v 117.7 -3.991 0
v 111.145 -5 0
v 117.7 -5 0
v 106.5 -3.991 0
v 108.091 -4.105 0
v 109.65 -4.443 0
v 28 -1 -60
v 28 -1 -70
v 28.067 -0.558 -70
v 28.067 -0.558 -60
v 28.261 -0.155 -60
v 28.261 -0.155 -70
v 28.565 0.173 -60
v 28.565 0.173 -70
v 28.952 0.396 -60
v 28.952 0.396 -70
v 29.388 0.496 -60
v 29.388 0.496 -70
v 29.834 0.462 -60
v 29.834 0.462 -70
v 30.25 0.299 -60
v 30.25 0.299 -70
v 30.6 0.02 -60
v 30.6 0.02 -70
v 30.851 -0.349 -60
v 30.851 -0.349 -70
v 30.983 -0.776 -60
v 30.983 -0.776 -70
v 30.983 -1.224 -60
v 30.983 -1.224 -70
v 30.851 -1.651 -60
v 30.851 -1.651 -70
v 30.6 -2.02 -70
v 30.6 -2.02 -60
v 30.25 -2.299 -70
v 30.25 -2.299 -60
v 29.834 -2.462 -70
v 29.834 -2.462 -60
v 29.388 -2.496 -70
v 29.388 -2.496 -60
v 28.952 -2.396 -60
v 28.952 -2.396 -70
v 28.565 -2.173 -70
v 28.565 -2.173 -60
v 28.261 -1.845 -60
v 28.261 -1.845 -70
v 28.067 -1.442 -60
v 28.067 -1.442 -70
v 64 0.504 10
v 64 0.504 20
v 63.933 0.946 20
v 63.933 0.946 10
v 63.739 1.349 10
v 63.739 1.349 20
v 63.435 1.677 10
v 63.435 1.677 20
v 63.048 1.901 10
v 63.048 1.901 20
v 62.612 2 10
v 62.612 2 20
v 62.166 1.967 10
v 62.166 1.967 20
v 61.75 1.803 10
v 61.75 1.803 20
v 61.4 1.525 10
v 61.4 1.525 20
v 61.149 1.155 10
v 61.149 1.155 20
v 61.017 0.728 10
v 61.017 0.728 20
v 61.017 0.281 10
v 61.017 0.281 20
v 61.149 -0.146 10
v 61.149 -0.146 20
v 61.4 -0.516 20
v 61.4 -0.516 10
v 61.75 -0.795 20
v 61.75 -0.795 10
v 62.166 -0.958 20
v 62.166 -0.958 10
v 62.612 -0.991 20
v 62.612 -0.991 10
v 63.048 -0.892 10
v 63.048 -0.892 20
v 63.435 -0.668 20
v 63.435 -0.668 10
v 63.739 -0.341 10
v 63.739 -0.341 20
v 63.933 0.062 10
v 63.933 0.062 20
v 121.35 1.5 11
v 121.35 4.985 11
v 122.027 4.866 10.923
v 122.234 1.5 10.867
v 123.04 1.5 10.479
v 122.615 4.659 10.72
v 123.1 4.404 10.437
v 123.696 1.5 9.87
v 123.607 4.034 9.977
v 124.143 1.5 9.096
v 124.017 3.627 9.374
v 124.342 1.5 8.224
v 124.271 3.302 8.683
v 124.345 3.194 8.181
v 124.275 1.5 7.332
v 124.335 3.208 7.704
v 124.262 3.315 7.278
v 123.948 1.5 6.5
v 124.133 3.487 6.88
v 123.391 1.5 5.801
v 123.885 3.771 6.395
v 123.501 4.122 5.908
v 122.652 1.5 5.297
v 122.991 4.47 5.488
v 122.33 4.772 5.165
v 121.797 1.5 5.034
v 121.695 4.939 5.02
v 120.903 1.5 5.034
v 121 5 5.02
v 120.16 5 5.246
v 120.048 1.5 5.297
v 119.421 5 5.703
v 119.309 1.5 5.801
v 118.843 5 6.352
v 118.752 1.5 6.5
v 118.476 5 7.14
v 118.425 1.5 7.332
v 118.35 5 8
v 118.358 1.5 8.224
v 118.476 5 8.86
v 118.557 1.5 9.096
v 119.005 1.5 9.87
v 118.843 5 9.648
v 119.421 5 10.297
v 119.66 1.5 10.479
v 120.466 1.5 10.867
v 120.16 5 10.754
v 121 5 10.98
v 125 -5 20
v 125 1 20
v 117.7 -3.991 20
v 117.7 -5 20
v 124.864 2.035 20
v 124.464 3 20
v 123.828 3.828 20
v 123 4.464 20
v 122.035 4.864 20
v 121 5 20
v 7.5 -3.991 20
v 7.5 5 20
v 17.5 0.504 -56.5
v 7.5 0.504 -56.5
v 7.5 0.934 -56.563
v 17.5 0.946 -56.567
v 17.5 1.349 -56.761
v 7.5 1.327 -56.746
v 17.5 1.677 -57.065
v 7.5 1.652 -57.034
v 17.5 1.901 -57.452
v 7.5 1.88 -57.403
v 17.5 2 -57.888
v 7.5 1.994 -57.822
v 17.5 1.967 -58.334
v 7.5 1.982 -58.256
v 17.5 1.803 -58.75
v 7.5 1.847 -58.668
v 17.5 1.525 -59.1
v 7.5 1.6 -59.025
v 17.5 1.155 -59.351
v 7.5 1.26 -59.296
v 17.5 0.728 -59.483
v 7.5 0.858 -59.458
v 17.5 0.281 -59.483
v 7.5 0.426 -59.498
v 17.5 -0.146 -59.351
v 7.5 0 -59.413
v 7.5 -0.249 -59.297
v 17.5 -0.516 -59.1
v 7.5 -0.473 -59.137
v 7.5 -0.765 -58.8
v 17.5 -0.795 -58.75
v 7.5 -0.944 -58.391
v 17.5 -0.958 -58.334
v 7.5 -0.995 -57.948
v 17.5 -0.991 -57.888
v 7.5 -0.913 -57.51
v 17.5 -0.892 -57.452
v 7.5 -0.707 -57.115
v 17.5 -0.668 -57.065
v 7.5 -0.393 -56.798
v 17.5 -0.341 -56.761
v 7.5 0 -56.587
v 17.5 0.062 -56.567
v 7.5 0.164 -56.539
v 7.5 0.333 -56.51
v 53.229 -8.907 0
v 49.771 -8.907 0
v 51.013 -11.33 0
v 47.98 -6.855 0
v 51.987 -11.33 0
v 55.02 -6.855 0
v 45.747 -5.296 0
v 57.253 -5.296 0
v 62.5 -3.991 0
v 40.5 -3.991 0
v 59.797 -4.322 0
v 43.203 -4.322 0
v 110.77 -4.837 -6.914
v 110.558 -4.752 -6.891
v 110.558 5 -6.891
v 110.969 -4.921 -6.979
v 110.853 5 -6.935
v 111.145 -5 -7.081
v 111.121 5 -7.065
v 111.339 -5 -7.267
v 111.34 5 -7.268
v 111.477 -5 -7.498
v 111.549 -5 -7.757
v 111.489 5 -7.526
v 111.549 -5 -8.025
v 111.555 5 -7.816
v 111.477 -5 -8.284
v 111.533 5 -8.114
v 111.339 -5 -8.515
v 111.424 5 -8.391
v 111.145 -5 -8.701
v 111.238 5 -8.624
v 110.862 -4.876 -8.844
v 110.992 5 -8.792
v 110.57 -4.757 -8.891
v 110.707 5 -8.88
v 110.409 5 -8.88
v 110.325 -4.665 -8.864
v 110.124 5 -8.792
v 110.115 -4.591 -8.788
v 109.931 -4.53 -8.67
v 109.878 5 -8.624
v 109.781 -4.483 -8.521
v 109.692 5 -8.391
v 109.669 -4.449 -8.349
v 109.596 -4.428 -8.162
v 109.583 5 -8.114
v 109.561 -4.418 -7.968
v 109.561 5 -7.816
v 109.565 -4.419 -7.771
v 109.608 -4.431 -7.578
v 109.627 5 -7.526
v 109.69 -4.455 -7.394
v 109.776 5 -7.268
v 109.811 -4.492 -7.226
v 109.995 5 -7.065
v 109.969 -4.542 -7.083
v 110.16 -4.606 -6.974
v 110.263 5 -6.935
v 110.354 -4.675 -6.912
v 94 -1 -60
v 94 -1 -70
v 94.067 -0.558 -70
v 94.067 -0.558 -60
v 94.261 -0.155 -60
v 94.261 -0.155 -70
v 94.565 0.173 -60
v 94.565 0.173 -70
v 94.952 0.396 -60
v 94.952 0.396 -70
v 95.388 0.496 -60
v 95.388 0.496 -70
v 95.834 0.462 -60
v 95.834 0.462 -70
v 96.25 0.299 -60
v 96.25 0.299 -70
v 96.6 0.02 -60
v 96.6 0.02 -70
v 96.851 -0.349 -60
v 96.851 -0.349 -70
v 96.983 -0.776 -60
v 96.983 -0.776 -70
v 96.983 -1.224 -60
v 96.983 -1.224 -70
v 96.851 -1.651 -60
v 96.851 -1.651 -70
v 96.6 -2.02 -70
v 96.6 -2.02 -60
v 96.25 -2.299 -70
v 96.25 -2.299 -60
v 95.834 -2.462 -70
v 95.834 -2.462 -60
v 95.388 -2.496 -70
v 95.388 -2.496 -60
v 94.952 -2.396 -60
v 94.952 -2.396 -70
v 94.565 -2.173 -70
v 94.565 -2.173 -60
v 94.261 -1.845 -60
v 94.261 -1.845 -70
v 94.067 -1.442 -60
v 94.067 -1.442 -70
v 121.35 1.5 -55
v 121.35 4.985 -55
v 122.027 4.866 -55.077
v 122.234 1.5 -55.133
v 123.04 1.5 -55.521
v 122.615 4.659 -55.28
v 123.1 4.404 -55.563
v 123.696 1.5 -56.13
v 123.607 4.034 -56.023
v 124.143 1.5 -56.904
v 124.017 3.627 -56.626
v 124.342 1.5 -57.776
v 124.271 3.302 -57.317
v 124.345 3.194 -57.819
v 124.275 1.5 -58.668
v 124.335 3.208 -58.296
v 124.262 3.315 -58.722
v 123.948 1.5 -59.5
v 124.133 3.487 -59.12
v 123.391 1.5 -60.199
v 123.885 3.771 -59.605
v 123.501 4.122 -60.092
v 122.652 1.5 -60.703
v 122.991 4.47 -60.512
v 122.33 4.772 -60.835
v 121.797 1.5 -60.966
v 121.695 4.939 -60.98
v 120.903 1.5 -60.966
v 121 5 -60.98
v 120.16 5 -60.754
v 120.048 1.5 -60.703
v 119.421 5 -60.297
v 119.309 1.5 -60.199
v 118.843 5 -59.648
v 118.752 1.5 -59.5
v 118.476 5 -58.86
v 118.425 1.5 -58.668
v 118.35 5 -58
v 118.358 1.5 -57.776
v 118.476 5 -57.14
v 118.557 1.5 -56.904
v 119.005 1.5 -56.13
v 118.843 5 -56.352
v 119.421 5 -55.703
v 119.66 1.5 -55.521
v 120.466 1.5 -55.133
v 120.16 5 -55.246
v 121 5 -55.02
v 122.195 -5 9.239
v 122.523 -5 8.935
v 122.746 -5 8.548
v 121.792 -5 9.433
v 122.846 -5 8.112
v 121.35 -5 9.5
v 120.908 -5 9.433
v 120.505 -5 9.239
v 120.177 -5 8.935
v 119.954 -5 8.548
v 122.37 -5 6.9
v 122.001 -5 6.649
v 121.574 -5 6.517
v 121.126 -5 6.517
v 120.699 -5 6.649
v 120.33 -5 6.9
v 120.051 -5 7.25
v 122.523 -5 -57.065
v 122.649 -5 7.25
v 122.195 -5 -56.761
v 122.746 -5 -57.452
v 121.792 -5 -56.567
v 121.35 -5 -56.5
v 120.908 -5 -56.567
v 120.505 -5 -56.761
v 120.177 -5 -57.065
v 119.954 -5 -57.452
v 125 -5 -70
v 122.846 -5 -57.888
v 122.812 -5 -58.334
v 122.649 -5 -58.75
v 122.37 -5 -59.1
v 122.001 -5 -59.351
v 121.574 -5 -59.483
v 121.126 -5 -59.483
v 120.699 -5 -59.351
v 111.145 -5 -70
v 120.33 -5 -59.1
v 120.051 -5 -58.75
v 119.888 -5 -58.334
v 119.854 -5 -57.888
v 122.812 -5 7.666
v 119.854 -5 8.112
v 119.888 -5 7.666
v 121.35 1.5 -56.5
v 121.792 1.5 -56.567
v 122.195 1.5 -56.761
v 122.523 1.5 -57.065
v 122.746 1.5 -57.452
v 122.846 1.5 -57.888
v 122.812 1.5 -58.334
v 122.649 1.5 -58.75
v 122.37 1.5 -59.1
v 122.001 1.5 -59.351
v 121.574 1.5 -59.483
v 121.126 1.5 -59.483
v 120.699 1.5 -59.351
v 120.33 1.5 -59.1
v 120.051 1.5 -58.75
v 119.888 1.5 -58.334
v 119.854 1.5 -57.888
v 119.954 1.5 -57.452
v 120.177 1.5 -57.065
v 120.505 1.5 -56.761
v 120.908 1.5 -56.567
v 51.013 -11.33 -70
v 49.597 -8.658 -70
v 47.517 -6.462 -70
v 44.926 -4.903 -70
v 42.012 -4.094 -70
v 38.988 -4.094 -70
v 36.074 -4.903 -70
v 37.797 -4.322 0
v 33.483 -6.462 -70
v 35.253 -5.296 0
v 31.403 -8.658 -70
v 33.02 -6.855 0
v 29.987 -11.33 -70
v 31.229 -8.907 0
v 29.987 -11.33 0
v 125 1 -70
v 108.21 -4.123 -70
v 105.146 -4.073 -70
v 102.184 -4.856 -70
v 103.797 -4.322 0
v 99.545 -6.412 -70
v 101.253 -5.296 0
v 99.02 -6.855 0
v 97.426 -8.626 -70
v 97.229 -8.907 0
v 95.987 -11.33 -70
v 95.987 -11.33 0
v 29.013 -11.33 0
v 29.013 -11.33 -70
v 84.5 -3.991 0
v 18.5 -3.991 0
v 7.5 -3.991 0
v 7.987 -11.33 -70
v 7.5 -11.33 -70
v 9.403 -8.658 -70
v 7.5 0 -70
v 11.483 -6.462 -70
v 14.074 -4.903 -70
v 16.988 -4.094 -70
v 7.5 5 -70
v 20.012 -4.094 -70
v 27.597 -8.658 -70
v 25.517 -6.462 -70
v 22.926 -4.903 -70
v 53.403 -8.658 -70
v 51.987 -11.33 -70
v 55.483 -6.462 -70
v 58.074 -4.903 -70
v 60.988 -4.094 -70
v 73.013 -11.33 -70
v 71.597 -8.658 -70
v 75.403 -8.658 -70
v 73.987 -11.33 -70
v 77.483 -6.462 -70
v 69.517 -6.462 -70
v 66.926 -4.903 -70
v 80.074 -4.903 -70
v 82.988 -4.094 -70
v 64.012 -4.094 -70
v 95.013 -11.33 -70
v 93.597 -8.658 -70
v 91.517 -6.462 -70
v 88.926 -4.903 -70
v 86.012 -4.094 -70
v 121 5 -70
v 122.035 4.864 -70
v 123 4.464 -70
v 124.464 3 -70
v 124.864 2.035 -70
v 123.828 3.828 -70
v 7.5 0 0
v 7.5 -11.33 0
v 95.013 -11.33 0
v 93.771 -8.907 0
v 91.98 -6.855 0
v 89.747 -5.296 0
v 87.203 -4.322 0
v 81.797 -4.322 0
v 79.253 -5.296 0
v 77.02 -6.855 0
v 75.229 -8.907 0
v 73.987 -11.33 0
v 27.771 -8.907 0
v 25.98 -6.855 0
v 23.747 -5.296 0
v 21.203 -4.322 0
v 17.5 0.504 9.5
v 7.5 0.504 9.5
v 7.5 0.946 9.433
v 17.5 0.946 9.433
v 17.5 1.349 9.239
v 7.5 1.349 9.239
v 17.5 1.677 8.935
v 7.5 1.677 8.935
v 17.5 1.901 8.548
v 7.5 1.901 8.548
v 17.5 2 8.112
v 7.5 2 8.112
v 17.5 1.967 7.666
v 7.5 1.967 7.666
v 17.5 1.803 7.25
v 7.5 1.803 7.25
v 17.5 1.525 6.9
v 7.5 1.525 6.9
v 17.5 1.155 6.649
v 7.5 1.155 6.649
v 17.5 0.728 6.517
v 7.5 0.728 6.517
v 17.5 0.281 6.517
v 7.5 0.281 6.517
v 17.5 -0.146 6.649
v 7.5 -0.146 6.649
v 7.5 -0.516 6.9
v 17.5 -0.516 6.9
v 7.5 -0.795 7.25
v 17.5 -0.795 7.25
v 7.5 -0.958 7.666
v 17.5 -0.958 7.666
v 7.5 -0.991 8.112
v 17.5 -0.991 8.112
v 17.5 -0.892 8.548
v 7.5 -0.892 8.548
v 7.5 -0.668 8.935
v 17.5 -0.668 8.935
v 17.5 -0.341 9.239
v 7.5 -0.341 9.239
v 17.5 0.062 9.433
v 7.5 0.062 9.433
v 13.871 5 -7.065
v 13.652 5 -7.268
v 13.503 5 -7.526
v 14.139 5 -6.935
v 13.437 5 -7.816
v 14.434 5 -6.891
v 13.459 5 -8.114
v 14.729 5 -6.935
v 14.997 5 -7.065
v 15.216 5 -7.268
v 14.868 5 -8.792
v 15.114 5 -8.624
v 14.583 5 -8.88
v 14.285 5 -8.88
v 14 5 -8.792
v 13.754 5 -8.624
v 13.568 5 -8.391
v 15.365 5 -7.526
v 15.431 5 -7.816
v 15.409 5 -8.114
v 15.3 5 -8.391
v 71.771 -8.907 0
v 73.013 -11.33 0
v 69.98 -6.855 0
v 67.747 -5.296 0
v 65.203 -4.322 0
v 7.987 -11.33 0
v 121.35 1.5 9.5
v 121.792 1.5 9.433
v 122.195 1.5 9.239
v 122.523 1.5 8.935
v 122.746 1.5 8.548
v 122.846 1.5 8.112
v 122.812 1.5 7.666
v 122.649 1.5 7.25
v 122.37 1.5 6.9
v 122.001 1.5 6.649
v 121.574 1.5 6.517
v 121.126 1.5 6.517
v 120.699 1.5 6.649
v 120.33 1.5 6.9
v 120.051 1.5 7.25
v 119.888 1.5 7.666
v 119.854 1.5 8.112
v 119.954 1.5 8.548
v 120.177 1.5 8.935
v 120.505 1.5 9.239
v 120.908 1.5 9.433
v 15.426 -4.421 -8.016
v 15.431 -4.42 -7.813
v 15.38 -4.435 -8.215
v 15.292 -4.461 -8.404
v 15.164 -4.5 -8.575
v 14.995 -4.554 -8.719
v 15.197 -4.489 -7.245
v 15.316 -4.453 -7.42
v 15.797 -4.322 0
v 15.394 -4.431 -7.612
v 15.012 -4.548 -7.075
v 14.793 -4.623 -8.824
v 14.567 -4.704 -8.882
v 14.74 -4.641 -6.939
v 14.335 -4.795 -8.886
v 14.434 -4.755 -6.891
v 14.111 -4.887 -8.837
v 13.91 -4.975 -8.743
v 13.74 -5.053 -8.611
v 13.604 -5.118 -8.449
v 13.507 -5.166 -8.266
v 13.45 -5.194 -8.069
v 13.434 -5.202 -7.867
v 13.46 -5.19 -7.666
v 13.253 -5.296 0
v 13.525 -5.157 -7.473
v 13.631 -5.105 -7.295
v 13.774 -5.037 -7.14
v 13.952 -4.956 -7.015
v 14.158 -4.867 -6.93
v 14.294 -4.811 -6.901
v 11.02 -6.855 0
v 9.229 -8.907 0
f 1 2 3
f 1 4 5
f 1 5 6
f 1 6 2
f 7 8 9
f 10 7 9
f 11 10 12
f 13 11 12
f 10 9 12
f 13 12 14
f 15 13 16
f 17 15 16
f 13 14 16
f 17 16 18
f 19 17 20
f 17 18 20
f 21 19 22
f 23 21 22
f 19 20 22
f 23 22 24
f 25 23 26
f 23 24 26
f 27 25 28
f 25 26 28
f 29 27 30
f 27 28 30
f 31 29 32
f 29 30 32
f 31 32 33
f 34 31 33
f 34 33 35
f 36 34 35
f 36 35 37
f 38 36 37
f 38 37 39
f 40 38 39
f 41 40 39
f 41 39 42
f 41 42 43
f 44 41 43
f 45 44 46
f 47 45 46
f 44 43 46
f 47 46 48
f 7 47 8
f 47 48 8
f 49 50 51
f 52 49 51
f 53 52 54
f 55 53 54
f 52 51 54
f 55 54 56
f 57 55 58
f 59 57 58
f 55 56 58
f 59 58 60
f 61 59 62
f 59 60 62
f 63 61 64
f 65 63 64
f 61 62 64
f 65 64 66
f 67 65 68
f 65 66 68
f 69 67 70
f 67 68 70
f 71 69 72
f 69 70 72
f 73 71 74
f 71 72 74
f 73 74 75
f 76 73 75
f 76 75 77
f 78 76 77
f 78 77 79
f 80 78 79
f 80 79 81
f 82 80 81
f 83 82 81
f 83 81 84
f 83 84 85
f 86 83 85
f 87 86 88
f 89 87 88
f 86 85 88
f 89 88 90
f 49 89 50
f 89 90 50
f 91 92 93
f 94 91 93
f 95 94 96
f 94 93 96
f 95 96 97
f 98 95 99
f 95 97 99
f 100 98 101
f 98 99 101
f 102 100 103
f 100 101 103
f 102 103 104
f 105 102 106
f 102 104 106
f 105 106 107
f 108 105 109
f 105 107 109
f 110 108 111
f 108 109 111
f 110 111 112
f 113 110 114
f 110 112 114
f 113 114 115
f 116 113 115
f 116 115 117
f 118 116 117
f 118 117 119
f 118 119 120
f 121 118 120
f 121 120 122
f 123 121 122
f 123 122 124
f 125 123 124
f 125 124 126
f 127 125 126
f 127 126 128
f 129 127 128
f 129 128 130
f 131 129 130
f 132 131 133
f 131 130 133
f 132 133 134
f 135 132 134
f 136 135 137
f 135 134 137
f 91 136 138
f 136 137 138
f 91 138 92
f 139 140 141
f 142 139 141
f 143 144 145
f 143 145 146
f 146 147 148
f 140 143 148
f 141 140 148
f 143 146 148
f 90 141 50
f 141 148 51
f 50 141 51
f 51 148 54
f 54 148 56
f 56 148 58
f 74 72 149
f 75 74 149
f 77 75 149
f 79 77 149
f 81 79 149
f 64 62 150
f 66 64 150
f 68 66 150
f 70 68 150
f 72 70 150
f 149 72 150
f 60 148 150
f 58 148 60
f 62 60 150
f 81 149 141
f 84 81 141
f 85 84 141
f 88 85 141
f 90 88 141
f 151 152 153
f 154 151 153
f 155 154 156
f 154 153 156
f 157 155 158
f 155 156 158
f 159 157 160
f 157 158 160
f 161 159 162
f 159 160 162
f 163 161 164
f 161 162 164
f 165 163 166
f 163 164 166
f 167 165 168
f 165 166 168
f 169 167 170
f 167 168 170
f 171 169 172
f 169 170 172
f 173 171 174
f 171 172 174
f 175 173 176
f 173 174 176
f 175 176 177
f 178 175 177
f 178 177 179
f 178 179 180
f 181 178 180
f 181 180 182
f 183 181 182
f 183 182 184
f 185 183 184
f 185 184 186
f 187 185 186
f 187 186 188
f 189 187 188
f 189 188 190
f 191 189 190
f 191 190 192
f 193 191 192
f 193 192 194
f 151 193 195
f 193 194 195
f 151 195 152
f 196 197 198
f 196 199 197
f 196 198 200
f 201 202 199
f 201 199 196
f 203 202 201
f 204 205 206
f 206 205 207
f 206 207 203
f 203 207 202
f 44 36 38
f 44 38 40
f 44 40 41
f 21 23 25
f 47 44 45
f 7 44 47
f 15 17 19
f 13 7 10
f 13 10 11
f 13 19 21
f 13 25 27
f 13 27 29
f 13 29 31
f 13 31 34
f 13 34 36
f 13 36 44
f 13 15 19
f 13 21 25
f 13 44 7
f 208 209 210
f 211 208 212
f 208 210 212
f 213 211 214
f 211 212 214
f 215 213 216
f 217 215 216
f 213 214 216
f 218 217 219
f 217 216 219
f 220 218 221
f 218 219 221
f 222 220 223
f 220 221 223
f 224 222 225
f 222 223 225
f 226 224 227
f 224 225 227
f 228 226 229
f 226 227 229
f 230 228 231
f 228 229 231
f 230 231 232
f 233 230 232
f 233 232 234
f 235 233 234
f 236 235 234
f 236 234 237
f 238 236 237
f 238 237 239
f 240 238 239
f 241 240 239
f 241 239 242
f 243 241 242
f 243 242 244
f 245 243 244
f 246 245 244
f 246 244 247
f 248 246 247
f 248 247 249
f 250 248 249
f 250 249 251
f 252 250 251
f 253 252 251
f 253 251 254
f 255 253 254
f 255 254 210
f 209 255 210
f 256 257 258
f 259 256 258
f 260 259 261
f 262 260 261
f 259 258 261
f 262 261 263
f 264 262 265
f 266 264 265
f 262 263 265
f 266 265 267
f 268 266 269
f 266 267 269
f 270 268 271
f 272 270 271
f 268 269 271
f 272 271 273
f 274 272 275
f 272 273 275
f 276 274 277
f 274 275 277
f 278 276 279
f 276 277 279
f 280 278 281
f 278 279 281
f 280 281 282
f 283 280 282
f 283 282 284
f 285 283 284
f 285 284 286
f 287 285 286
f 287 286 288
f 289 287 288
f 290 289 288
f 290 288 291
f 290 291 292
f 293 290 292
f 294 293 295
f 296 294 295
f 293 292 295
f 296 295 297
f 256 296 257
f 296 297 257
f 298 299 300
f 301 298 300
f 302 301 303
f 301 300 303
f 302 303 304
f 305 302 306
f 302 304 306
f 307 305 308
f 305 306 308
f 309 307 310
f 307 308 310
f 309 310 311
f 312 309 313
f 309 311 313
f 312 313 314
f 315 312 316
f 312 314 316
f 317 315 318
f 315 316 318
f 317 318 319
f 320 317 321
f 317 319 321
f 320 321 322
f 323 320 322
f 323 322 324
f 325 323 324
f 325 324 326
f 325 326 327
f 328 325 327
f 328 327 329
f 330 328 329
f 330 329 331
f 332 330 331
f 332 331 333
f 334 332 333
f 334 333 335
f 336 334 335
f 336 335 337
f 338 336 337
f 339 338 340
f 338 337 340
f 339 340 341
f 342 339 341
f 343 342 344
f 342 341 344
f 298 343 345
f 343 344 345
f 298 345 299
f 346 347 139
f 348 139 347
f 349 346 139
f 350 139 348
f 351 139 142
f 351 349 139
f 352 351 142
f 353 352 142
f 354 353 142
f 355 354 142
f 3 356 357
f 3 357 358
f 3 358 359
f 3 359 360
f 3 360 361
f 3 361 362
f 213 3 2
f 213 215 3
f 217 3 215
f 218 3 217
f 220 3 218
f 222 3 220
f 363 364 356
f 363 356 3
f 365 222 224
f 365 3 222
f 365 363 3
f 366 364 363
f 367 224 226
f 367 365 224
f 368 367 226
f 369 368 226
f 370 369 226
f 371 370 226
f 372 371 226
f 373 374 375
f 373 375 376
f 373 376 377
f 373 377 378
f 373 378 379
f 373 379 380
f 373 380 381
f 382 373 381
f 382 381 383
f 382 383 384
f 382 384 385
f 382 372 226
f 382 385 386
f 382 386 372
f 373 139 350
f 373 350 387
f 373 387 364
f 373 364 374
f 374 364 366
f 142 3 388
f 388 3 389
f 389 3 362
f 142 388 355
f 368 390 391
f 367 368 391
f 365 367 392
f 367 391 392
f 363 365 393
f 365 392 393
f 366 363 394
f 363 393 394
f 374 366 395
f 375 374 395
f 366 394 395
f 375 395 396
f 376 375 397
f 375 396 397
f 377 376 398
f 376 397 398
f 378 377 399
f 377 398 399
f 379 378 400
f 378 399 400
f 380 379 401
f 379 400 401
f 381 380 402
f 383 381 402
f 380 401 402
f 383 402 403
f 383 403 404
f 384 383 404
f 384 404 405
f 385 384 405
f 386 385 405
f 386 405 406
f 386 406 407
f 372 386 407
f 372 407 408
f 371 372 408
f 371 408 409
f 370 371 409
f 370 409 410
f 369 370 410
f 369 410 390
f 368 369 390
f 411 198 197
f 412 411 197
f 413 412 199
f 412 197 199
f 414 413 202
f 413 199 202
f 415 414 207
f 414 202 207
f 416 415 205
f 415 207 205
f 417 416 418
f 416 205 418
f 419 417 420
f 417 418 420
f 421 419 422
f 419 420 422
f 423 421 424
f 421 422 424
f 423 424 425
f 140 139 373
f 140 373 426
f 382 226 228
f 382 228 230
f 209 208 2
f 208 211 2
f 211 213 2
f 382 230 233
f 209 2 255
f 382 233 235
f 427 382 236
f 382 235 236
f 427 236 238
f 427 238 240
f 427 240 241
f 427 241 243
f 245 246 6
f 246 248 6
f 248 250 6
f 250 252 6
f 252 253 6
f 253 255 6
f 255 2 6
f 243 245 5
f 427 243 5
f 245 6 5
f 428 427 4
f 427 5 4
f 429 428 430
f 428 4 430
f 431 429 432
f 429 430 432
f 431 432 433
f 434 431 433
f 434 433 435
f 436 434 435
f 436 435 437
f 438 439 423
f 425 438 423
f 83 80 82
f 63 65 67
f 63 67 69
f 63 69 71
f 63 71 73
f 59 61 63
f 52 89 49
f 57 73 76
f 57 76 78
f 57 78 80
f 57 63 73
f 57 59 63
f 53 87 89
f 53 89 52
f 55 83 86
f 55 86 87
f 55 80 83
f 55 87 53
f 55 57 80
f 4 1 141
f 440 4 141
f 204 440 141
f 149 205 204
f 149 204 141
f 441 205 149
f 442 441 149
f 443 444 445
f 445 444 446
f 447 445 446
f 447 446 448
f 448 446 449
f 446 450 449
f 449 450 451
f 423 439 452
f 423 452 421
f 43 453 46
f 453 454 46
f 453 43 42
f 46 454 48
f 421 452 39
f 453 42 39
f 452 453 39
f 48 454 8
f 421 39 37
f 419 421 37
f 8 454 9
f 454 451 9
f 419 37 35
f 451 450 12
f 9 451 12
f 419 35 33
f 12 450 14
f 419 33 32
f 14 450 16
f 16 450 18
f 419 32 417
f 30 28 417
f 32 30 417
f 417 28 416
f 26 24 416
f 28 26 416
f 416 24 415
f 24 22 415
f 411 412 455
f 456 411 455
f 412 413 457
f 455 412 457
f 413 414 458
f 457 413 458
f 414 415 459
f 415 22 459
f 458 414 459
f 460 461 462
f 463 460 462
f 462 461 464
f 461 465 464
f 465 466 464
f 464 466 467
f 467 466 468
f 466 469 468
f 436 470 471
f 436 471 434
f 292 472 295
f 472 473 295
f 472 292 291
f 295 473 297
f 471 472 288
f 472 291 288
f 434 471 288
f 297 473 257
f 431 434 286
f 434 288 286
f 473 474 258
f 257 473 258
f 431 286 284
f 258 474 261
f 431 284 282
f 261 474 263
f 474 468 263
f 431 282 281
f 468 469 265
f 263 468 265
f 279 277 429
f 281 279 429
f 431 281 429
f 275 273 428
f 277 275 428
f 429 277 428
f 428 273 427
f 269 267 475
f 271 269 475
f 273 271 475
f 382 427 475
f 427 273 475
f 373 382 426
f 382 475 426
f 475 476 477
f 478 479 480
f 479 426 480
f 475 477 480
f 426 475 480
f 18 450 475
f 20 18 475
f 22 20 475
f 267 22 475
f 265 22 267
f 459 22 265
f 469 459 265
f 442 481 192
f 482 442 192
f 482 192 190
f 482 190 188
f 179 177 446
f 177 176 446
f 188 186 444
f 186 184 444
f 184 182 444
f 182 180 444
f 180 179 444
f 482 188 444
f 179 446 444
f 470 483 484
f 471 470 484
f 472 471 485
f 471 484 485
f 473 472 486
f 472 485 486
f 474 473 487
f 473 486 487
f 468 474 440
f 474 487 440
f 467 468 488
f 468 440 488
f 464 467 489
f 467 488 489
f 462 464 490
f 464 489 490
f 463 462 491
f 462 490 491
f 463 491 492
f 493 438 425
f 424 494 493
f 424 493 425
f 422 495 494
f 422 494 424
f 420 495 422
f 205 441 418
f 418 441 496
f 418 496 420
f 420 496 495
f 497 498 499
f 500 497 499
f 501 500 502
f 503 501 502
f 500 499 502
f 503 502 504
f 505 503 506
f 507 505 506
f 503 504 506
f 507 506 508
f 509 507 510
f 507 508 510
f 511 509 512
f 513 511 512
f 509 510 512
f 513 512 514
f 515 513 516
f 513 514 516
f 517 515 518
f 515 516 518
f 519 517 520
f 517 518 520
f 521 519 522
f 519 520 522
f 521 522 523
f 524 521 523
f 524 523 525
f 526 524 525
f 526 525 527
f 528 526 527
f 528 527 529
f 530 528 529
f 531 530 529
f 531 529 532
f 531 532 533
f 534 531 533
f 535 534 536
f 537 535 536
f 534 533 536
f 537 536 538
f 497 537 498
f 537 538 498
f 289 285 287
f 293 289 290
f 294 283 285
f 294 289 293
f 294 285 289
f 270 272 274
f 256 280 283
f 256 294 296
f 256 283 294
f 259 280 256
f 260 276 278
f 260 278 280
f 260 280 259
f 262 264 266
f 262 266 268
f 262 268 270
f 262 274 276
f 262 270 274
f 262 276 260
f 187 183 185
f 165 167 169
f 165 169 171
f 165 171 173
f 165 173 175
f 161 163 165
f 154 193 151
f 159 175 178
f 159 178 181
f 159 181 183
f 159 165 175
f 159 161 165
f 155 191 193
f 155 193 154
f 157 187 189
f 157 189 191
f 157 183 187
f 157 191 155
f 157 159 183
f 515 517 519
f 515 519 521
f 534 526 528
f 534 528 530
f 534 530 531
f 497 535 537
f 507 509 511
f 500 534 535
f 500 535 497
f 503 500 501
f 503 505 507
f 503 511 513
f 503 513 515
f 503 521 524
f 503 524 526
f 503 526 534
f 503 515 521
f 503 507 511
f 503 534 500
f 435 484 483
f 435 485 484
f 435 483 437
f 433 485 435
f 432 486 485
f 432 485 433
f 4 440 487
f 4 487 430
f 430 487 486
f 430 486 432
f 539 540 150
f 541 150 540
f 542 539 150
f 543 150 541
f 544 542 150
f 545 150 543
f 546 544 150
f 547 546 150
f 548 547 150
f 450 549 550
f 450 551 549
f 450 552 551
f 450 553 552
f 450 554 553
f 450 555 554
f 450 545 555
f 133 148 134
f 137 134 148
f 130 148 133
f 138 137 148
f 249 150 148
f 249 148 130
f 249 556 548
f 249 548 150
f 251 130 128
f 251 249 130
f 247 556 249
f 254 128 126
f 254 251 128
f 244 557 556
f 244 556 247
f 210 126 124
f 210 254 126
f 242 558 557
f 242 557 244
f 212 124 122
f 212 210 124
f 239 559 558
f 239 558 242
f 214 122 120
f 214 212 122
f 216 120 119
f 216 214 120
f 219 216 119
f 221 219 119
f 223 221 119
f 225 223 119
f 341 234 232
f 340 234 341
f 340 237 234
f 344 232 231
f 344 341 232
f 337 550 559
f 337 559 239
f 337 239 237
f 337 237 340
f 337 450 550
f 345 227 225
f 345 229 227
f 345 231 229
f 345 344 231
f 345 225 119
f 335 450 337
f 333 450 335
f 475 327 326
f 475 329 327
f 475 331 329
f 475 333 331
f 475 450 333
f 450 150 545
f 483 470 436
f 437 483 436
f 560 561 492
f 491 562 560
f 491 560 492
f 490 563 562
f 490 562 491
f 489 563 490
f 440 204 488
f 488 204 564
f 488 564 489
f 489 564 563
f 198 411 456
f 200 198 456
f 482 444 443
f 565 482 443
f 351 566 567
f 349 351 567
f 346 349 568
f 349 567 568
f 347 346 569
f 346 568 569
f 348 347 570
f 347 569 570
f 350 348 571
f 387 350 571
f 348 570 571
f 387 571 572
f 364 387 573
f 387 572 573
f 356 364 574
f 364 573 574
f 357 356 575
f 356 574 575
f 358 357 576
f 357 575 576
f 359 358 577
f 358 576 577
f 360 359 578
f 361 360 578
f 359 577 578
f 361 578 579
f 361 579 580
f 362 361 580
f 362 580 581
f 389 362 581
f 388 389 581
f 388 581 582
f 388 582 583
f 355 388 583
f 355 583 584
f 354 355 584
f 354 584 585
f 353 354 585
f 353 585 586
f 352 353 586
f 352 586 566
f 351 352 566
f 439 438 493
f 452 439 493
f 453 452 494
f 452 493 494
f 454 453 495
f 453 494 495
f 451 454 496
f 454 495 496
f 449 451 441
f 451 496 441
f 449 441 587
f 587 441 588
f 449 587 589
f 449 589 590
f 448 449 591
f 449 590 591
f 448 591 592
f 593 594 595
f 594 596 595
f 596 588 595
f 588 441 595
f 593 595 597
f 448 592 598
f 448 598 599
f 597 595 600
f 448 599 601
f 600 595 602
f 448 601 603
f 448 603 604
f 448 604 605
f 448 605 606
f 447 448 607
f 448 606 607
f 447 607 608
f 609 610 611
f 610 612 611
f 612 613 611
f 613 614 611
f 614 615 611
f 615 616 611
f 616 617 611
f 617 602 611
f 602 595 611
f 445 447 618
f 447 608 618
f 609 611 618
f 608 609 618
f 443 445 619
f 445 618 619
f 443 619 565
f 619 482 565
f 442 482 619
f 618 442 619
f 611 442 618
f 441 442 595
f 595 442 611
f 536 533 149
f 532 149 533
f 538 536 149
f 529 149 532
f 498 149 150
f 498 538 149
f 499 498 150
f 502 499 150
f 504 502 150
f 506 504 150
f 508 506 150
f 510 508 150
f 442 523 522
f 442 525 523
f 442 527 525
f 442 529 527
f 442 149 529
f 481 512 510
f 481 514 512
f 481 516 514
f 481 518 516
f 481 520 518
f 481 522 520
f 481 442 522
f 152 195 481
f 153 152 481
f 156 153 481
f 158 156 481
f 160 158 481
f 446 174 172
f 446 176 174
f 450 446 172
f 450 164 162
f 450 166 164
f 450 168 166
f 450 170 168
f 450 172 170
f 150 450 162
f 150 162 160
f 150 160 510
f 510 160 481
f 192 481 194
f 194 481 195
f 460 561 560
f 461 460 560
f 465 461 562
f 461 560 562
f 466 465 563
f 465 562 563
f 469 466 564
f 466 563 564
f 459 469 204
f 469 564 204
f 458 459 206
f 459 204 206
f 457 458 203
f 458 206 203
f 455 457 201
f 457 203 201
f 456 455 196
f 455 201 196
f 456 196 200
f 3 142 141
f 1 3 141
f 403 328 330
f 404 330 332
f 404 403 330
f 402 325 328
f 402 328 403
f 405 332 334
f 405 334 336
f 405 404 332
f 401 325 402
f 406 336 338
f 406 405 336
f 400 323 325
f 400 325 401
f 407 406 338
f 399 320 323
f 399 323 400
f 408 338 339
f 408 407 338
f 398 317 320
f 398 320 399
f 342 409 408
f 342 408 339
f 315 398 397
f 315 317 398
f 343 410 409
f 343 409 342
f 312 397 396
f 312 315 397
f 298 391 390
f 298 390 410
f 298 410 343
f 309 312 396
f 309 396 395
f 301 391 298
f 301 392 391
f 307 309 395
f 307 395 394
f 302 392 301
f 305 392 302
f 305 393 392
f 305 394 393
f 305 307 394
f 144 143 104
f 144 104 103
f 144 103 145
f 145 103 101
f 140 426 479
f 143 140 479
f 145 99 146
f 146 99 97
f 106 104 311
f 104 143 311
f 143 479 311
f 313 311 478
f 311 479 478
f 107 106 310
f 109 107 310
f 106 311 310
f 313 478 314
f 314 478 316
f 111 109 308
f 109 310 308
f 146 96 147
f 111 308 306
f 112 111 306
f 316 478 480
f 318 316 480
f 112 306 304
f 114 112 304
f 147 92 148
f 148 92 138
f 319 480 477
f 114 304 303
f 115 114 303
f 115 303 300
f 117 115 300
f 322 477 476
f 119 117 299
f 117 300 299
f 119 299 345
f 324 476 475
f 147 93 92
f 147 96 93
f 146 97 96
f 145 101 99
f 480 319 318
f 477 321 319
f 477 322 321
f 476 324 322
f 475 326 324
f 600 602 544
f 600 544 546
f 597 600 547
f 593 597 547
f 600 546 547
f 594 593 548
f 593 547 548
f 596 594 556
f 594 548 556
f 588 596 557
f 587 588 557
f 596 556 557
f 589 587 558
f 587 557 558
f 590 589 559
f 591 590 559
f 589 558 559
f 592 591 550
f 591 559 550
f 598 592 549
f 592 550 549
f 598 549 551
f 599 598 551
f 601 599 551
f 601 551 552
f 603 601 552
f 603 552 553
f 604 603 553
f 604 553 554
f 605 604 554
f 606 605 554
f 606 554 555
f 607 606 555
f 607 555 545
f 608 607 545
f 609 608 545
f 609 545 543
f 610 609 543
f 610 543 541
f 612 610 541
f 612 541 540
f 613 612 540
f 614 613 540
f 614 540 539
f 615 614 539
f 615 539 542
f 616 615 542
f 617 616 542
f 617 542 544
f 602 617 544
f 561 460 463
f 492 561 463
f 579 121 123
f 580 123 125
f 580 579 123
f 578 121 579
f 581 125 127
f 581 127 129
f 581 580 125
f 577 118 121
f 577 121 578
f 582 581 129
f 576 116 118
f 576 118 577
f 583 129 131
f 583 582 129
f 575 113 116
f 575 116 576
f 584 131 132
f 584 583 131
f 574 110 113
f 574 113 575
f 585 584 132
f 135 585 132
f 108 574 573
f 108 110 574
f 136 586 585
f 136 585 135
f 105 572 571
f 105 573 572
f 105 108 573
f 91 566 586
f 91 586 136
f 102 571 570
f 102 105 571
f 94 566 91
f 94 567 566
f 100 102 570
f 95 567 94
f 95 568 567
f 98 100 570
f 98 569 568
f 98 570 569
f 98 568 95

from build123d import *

# Parameters (mm, degrees)
SKETCH_1_W          = 125
SKETCH_1_H          = 70
EXTRUDE_1_DEPTH     = 5
SKETCH_2_W          = 7.5
SKETCH_2_H          = 5
CUT_EXTRUDE_1_DEPTH = 70
EXTRUDE_START       = -70
EXTRUDE_2_DEPTH     = 70
CUT_EXTRUDE_2_REACH = 145.713
SKETCH_5_R          = 11.2
EXTRUDE_3_DEPTH     = 20
SKETCH_7_R          = 1.5
CUT_EXTRUDE_3_DEPTH = 10
CUT_EXTRUDE_4_REACH = 146.193
SKETCH_8_R          = 1.5
SKETCH_9_R          = 3
SKETCH_9_R_2        = 1.5
CUT_EXTRUDE_5_DEPTH = 3.5
SKETCH_11_R         = 1.5
CUT_EXTRUDE_6_DEPTH = 10
CUT_EXTRUDE_7_REACH = 146.193
SKETCH_12_R         = 1
FILLET_1_R          = 4
SKETCH_14_R         = 1.5
CUT_EXTRUDE_8_DEPTH = 10


# Read off the part's stored shape, not the designer's step: 凸台-拉伸2
with BuildPart() as part:
    # 草图1 → 凸台-拉伸1 (new body)
    with BuildSketch(Plane(origin=(0, 0, 0), x_dir=(1, 0, 0), z_dir=(0, 1, 0))):
        with Locations((62.5, 35)):
            Rectangle(SKETCH_1_W, SKETCH_1_H)
    extrude(amount=EXTRUDE_1_DEPTH)

    # 草图2 → 切除-拉伸1 (cut)
    with BuildSketch(Plane.XY):
        with Locations((3.75, 2.5)):
            Rectangle(SKETCH_2_W, SKETCH_2_H)
    extrude(amount=-CUT_EXTRUDE_1_DEPTH, mode=Mode.SUBTRACT)

    # 凸台-拉伸2 outline → 凸台-拉伸2 (add)
    with BuildSketch(Plane.XY.offset(EXTRUDE_START)):
        with BuildLine():
            Line((125, -5), (125, 0))
            Line((125, 0), (7.5, 0))
            Line((7.5, 0), (7.500013395, -11.329987981))
            Line((7.500013395, -11.329987981), (8.200014526, -11.329987981))
            ThreePointArc((8.200014526, -11.329987981), (18.500017961, -4.191325734), (28.800021395, -11.329987981))
            Line((28.800021395, -11.329987981), (30.200014526, -11.329987981))
            ThreePointArc((30.200014526, -11.329987981), (40.500017961, -4.191325734), (50.800021395, -11.329987981))
            Line((50.800021395, -11.329987981), (52.200014526, -11.329987981))
            ThreePointArc((52.200014526, -11.329987981), (62.500017961, -4.191325734), (72.800021395, -11.329987981))
            Line((72.800021395, -11.329987981), (74.200014526, -11.329987981))
            ThreePointArc((74.200014526, -11.329987981), (84.500017961, -4.191325734), (94.800021395, -11.329987981))
            Line((94.800021395, -11.329987981), (96.200014526, -11.329987981))
            ThreePointArc((96.200014526, -11.329987981), (102.083615638, -5.116833662), (110.639689418, -5))
            Line((110.639689418, -5), (125, -5))
        make_face()
    extrude(amount=EXTRUDE_2_DEPTH)

    # 草图5 → 切除-拉伸2 (cut, up to next)
    with BuildSketch(Plane.XY, mode=Mode.PRIVATE) as cut_extrude_2_sk1:
        with Locations((18.500017961, -15.191325734)):
            Circle(SKETCH_5_R)
    cut_extrude_2_tool1 = extrude(cut_extrude_2_sk1.sketch, amount=-CUT_EXTRUDE_2_REACH, mode=Mode.PRIVATE) & part.part
    # 草图5 → 切除-拉伸2 (cut, up to next)
    with BuildSketch(Plane.XY, mode=Mode.PRIVATE) as cut_extrude_2_sk2:
        with Locations((40.500017961, -15.191325734)):
            Circle(SKETCH_5_R)
    cut_extrude_2_tool2 = extrude(cut_extrude_2_sk2.sketch, amount=-CUT_EXTRUDE_2_REACH, mode=Mode.PRIVATE) & part.part
    # 草图5 → 切除-拉伸2 (cut, up to next)
    with BuildSketch(Plane.XY, mode=Mode.PRIVATE) as cut_extrude_2_sk3:
        with Locations((62.500017961, -15.191325734)):
            Circle(SKETCH_5_R)
    cut_extrude_2_tool3 = extrude(cut_extrude_2_sk3.sketch, amount=-CUT_EXTRUDE_2_REACH, mode=Mode.PRIVATE) & part.part
    # 草图5 → 切除-拉伸2 (cut, up to next)
    with BuildSketch(Plane.XY, mode=Mode.PRIVATE) as cut_extrude_2_sk4:
        with Locations((84.500017961, -15.191325734)):
            Circle(SKETCH_5_R)
    cut_extrude_2_tool4 = extrude(cut_extrude_2_sk4.sketch, amount=-CUT_EXTRUDE_2_REACH, mode=Mode.PRIVATE) & part.part
    # 草图5 → 切除-拉伸2 (cut, up to next)
    with BuildSketch(Plane.XY, mode=Mode.PRIVATE) as cut_extrude_2_sk5:
        with Locations((106.500017961, -15.191325734)):
            Circle(SKETCH_5_R)
    cut_extrude_2_tool5 = extrude(cut_extrude_2_sk5.sketch, amount=-CUT_EXTRUDE_2_REACH, mode=Mode.PRIVATE) & part.part
    add(cut_extrude_2_tool1.solids().sort_by_distance((18.500018, -15.191326, 0))[0], mode=Mode.SUBTRACT)
    add(cut_extrude_2_tool2.solids().sort_by_distance((40.500018, -15.191326, 0))[0], mode=Mode.SUBTRACT)
    add(cut_extrude_2_tool3.solids().sort_by_distance((62.500018, -15.191326, 0))[0], mode=Mode.SUBTRACT)
    add(cut_extrude_2_tool4.solids().sort_by_distance((84.500018, -15.191326, 0))[0], mode=Mode.SUBTRACT)
    add(cut_extrude_2_tool5.solids().sort_by_distance((106.500018, -15.191326, 0))[0], mode=Mode.SUBTRACT)

    # 草图6 → 凸台-拉伸3 (add)
    with BuildSketch(Plane.XY):
        Polygon((7.5, 5), (125, 5), (125, -3.991325734), (125, -5), (117.700017961, -5), (117.700017961, -3.991325734), (7.5, -3.991325734), align=None)
    extrude(amount=EXTRUDE_3_DEPTH)

    # 草图7 → 切除-拉伸3 (cut)
    with BuildSketch(Plane(origin=(0, 0, -70), x_dir=(-1, 0, 0), z_dir=(0, 0, -1))):
        with Locations((-29.49999102, -1)):
            Circle(SKETCH_7_R)
        with Locations((-95.50000898, -1)):
            Circle(SKETCH_7_R)
    extrude(amount=-CUT_EXTRUDE_3_DEPTH, mode=Mode.SUBTRACT)

    # 草图8 → 切除-拉伸4 (cut, up to next)
    with BuildSketch(Plane(origin=(0, 5, 0), x_dir=(1, 0, 0), z_dir=(0, 1, 0)), mode=Mode.PRIVATE) as cut_extrude_4_sk1:
        with Locations(Location((121.35000898, 58, 0), (0, 0, 270))):
            Circle(SKETCH_8_R)
    cut_extrude_4_tool1 = extrude(cut_extrude_4_sk1.sketch, amount=-CUT_EXTRUDE_4_REACH, mode=Mode.PRIVATE) & part.part
    # 草图8 → 切除-拉伸4 (cut, up to next)
    with BuildSketch(Plane(origin=(0, 5, 0), x_dir=(1, 0, 0), z_dir=(0, 1, 0)), mode=Mode.PRIVATE) as cut_extrude_4_sk2:
        with Locations(Location((121.35000898, -8, 0), (0, 0, 270))):
            Circle(SKETCH_8_R)
    cut_extrude_4_tool2 = extrude(cut_extrude_4_sk2.sketch, amount=-CUT_EXTRUDE_4_REACH, mode=Mode.PRIVATE) & part.part
    add(cut_extrude_4_tool1.solids().sort_by_distance((121.350009, 5, -58))[0], mode=Mode.SUBTRACT)
    add(cut_extrude_4_tool2.solids().sort_by_distance((121.350009, 5, 8))[0], mode=Mode.SUBTRACT)

    # 草图9 → 切除-拉伸5 (cut)
    # profile 1 of 2: a face of its own
    with BuildSketch(Plane(origin=(0, 5, 0), x_dir=(1, 0, 0), z_dir=(0, 1, 0))):
        with Locations(Location((121.35000898, 58, 0), (0, 0, 270))):
            Circle(SKETCH_9_R)
        with Locations(Location((121.35000898, 58, 0), (0, 0, 270))):
            Circle(SKETCH_9_R_2, mode=Mode.SUBTRACT)
    # profile 2 of 2: a face of its own
    with BuildSketch(Plane(origin=(0, 5, 0), x_dir=(1, 0, 0), z_dir=(0, 1, 0))):
        with Locations(Location((121.35000898, -8, 0), (0, 0, 270))):
            Circle(SKETCH_9_R)
        with Locations(Location((121.35000898, -8, 0), (0, 0, 270))):
            Circle(SKETCH_9_R_2, mode=Mode.SUBTRACT)
    extrude(amount=-CUT_EXTRUDE_5_DEPTH, mode=Mode.SUBTRACT)

    # 草图11 → 切除-拉伸6 (cut)
    with BuildSketch(Plane.ZY.offset(-7.5)):
        with Locations((8, 0.504337133)):
            Circle(SKETCH_11_R)
        with Locations((-58, 0.504337133)):
            Circle(SKETCH_11_R)
    extrude(amount=-CUT_EXTRUDE_6_DEPTH, mode=Mode.SUBTRACT)

    # 草图12 → 切除-拉伸7 (cut, up to next)
    with BuildSketch(Plane(origin=(0, 5, 0), x_dir=(1, 0, 0), z_dir=(0, 1, 0)), mode=Mode.PRIVATE) as cut_extrude_7_sk1:
        with Locations(Location((110.558, 7.891, 0), (0, 0, 270))):
            Circle(SKETCH_12_R)
    cut_extrude_7_tool1 = extrude(cut_extrude_7_sk1.sketch, amount=-CUT_EXTRUDE_7_REACH, mode=Mode.PRIVATE) & part.part
    # 草图12 → 切除-拉伸7 (cut, up to next)
    with BuildSketch(Plane(origin=(0, 5, 0), x_dir=(1, 0, 0), z_dir=(0, 1, 0)), mode=Mode.PRIVATE) as cut_extrude_7_sk2:
        with Locations(Location((14.434, 7.891, 0), (0, 0, 270))):
            Circle(SKETCH_12_R)
    cut_extrude_7_tool2 = extrude(cut_extrude_7_sk2.sketch, amount=-CUT_EXTRUDE_7_REACH, mode=Mode.PRIVATE) & part.part
    add(cut_extrude_7_tool1.solids().sort_by_distance((110.558, 5, -7.891))[0], mode=Mode.SUBTRACT)
    add(cut_extrude_7_tool2.solids().sort_by_distance((14.434, 5, -7.891))[0], mode=Mode.SUBTRACT)

    # 圆角1
    # the kernel refuses this fillet: 4 mm, written as the material it takes off along each edge
    with BuildSketch(Plane(origin=(125, 5, -80), x_dir=(0, -1, 0), z_dir=(0, 0, 1))) as fillet_1_piece_1:
        with BuildLine():
            CenterArc((FILLET_1_R, -FILLET_1_R), FILLET_1_R, 90, 90)
            Line((0, -FILLET_1_R), (0, 0))
            Line((0, 0), (FILLET_1_R, 0))
        make_face()
    extrude(amount=110, mode=Mode.SUBTRACT)

    # 草图14 → 切除-拉伸8 (cut)
    with BuildSketch(Plane.XY.offset(20)):
        with Locations((62.5, 0.504337133)):
            Circle(SKETCH_14_R)
    extrude(amount=-CUT_EXTRUDE_8_DEPTH, mode=Mode.SUBTRACT)


solid = part.part
